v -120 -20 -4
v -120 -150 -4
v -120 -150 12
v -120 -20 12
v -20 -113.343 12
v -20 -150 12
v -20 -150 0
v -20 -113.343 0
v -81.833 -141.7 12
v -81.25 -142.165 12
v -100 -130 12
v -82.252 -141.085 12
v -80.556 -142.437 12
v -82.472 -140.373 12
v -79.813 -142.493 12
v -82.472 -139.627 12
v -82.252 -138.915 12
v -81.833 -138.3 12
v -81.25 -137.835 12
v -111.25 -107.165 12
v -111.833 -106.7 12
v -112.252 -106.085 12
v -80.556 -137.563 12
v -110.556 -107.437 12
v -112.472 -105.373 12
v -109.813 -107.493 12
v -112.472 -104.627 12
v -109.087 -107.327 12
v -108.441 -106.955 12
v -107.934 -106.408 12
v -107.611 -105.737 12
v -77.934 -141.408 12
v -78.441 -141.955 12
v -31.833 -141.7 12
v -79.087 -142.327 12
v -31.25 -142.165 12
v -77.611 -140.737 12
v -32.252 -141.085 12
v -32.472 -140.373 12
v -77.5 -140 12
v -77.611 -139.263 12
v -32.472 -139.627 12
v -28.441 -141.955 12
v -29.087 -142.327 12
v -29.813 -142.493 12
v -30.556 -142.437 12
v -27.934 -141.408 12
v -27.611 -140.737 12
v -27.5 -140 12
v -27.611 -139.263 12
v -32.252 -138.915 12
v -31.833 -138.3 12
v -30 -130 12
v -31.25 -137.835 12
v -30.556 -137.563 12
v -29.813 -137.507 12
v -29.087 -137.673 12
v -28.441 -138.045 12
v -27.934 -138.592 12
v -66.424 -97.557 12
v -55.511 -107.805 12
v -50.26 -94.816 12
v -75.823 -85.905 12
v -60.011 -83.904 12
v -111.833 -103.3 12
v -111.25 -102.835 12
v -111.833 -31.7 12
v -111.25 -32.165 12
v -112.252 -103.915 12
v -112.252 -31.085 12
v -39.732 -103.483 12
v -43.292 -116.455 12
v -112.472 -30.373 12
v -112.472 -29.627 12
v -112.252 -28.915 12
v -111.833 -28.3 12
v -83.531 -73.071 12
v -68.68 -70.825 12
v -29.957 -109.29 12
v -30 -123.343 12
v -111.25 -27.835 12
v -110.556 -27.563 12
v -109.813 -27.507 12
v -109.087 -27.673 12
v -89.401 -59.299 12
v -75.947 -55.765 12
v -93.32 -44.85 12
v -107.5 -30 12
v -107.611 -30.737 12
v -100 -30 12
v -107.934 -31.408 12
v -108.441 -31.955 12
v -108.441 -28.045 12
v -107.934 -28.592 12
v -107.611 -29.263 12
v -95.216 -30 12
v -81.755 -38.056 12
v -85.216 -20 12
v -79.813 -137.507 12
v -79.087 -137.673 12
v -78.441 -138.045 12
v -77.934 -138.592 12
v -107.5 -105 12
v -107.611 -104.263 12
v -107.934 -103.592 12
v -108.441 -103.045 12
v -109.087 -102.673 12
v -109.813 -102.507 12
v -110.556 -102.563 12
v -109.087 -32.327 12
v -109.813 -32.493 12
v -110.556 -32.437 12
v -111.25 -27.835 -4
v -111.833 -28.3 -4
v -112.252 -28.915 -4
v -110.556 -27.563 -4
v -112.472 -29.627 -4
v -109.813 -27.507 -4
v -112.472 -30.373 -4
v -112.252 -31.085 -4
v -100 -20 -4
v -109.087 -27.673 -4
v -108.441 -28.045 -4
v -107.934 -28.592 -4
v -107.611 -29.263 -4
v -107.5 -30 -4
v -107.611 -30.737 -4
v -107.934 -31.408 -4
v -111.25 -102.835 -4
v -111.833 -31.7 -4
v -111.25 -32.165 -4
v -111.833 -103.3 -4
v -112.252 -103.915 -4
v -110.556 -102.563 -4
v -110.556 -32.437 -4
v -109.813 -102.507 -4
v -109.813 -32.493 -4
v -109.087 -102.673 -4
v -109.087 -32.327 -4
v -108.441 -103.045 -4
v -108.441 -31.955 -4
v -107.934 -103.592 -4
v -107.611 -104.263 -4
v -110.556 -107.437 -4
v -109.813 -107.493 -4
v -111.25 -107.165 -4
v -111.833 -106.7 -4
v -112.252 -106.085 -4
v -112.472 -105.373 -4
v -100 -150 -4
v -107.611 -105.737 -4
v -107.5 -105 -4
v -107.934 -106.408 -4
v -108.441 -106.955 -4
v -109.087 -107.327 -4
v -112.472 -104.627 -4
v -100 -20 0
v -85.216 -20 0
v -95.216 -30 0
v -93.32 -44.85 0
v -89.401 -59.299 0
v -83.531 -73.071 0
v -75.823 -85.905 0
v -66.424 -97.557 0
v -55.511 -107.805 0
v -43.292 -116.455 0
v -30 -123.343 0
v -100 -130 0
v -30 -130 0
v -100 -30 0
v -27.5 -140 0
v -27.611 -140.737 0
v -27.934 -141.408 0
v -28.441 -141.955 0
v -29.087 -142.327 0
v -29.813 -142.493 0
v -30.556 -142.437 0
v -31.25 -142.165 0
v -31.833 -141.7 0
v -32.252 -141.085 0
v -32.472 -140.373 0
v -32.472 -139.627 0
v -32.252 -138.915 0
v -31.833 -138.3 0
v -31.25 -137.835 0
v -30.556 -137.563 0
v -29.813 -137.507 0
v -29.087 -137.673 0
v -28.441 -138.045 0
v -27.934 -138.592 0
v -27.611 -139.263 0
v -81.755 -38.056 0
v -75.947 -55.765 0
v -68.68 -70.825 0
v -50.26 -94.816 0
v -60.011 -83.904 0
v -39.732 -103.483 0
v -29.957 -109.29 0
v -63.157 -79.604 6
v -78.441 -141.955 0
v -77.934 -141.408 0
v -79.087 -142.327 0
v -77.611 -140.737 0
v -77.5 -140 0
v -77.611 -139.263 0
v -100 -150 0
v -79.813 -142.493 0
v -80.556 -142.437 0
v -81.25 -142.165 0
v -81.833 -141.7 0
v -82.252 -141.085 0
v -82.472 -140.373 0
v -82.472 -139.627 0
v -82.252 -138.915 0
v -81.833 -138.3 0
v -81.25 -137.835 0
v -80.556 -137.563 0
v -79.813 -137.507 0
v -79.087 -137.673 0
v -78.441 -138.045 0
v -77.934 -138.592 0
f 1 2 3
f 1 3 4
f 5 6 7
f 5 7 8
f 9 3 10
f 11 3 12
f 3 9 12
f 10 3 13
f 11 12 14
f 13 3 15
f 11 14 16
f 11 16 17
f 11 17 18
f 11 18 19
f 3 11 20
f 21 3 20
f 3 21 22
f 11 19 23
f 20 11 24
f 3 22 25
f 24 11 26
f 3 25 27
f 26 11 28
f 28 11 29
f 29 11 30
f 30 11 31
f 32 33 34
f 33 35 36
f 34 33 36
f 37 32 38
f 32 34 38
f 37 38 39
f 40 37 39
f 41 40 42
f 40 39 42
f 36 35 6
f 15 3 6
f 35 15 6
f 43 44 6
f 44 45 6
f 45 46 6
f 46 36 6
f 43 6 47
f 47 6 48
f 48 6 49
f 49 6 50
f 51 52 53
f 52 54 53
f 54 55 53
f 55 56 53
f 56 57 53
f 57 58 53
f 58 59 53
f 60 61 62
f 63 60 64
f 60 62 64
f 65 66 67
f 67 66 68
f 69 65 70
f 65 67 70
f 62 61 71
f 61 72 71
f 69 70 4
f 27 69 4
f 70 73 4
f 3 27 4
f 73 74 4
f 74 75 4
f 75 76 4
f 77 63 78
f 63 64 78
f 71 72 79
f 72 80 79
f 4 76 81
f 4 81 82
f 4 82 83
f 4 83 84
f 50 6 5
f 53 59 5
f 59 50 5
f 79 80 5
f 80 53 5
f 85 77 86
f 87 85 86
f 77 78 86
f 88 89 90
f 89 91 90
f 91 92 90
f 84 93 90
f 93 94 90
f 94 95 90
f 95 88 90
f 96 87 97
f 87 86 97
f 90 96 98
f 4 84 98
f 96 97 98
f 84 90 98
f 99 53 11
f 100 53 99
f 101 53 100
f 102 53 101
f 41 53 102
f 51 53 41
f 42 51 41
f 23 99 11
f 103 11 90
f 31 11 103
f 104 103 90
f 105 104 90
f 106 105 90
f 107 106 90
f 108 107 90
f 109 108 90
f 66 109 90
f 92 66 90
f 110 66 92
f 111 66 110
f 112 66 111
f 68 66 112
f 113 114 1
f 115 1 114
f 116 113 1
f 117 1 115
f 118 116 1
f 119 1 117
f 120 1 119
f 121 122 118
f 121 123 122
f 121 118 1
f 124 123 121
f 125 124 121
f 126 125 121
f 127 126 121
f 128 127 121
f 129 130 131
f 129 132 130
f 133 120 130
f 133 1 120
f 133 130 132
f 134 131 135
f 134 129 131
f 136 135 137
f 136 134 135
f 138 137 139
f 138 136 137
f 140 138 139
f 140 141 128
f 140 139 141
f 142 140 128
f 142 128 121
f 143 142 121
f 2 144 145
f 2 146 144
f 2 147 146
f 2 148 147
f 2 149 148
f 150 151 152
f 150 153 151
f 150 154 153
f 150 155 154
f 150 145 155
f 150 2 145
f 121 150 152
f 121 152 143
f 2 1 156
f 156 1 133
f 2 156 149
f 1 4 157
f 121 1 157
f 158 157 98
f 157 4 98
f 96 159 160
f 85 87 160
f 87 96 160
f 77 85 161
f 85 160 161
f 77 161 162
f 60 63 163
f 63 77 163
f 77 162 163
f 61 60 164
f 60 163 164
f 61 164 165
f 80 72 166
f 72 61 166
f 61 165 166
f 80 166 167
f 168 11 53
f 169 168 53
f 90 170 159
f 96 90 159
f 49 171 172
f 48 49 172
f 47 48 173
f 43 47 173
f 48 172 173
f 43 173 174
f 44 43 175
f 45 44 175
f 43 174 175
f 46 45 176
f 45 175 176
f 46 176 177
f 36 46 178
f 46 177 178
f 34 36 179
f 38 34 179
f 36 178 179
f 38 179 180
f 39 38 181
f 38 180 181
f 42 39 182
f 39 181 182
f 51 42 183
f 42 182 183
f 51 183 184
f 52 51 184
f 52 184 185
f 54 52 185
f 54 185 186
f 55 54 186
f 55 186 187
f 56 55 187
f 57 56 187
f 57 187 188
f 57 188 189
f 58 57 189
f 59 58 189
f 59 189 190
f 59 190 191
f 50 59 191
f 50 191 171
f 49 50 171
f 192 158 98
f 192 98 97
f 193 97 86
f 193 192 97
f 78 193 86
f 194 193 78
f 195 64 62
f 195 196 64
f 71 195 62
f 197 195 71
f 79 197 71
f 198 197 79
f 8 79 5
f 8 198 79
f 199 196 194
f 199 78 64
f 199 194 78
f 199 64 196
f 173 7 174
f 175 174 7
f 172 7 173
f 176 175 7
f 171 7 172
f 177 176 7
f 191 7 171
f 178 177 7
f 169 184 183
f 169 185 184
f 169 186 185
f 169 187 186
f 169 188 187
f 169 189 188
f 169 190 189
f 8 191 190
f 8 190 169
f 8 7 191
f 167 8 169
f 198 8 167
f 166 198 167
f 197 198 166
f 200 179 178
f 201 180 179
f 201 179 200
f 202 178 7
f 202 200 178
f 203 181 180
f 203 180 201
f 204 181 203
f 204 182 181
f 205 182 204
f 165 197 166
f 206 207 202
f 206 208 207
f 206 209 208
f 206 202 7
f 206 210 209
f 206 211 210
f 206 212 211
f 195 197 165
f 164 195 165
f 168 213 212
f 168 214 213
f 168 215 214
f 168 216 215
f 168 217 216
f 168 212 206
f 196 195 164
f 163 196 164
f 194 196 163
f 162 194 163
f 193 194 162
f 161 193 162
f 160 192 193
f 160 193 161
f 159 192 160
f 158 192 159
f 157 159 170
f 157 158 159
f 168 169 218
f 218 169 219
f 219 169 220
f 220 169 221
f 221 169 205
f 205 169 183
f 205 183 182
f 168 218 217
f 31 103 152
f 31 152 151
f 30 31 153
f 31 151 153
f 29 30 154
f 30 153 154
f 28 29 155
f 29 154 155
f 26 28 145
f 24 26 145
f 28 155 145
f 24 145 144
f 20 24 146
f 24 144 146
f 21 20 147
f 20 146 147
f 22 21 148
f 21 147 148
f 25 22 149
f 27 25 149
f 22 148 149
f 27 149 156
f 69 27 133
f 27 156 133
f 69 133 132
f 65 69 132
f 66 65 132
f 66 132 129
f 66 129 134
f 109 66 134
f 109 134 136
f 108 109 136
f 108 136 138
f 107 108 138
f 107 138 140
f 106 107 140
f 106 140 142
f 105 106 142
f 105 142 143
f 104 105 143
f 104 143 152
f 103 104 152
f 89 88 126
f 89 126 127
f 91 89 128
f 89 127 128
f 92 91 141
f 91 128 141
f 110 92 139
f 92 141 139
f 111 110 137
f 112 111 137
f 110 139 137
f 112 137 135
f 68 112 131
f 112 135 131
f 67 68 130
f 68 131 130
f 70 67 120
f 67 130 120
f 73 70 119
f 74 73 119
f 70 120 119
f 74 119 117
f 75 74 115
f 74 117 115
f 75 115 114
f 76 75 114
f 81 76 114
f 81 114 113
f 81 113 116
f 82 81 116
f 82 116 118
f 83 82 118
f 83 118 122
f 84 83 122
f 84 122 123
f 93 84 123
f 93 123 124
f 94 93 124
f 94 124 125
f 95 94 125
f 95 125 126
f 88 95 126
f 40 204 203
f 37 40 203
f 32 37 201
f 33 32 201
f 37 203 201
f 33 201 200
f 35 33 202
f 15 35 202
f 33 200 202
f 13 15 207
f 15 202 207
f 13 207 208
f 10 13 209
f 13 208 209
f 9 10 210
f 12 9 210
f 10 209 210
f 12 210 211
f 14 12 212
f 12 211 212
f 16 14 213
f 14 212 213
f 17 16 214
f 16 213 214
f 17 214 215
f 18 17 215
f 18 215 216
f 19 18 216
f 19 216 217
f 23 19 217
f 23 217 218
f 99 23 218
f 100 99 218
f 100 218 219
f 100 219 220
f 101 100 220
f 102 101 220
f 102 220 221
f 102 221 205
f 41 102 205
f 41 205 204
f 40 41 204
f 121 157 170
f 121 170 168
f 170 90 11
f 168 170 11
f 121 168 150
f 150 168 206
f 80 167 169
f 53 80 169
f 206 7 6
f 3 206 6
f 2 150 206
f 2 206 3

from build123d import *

# Parameters (mm, degrees)
F1_DEPTH  = 12
F2_W      = 100
F2_H      = 20
F3_DEPTH  = 5
F4_W      = 135
F4_H      = 20
F5_DEPTH  = 5
F7_R      = 2.5
F8_DEPTH  = 25
F9_DEPTH  = 5
F10_W     = 20
F10_H     = 20
F10_W_2   = 100
F10_H_2   = 130
F11_DEPTH = 25
F12_W     = 130
F12_H     = 9
F13_DEPTH = 100.0010001
F15_DEPTH = 12.0010001
F16_W     = 80
F16_H     = 4
F17_DEPTH = 20


with BuildPart() as f1:
    # F0 (on Top) → F1 (new body)
    with BuildSketch(Plane.XY):
        with BuildLine():
            add(Edge.make_bspline(
                [(-86.5, 0), (-86.5, -116.5), (0, -116.5)],
                knots=[1.5707963268, 1.5707963268, 1.5707963268, 3.1415926536, 3.1415926536, 3.1415926536], degree=2, weights=[1, 0.7071067812, 1]))
            Line((-86.5, 0), (-86.5, -116.5))
            Line((-86.5, -116.5), (0, -116.5))
        make_face()
        Polygon((-86.5, -116.5), (-86.5, 0), (-100, 0), (-100, -130), (0, -130), (0, -116.5), align=None)
    extrude(amount=F1_DEPTH)

    # F2 (on face) → F3 (join)
    with BuildSketch(Plane.XZ.offset(130)):
        with Locations((-50, 6)):
            Rectangle(F2_W, F2_H)
    extrude(amount=F3_DEPTH)

    # F4 (on face) → F5 (join)
    with BuildSketch(Plane(origin=(-100, 0, 0), x_dir=(0, -1, 0), z_dir=(-1, 0, 0))):
        with Locations((67.5, 6)):
            Rectangle(F4_W, F4_H)
    extrude(amount=F5_DEPTH)

    # F7 (on face) → F8 (join)
    with BuildSketch(Plane(origin=(0, 0, -4), x_dir=(1, 0, 0), z_dir=(0, 0, -1))):
        Polygon((0, 135), (0, 150), (-120, 150), (-120, 0), (-105, 0), (-105, 135), align=None)
        with Locations((-110, 30)):
            Circle(F7_R, mode=Mode.SUBTRACT)
        with Locations((-110, 105)):
            Circle(F7_R, mode=Mode.SUBTRACT)
        with Locations((-80, 140)):
            Circle(F7_R, mode=Mode.SUBTRACT)
        with Locations((-30, 140)):
            Circle(F7_R, mode=Mode.SUBTRACT)
    extrude(amount=-F8_DEPTH)

    # F6 (on face) → F9 (join)
    with BuildSketch(Plane.XY.offset(16)):
        Polygon((-90, 0), (-105, 0), (-105, -135), (0, -135), (0, -120), (-90, -120), align=None)
    extrude(amount=F9_DEPTH)

    # F10 (on Top) → F11 (cut, symmetric)
    with BuildSketch(Plane.XY):
        with Locations((-10, -10)):
            Rectangle(F10_W, F10_H)
        with Locations((-70, -10)):
            Rectangle(F10_W_2, F10_H)
        with Locations((-10, -85)):
            Rectangle(F10_W, F10_H_2)
    extrude(amount=F11_DEPTH, both=True, mode=Mode.SUBTRACT)

    # F12 (on face) → F13 (cut, through all)
    with BuildSketch(Plane.YZ.offset(-20)):
        with Locations((-85, 16.5)):
            Rectangle(F12_W, F12_H)
    extrude(amount=-F13_DEPTH, mode=Mode.SUBTRACT)

    # F14 (on face) → F15 (cut, through all)
    with BuildSketch(Plane(origin=(0, 0, 0), x_dir=(1, 0, 0), z_dir=(0, 0, -1))):
        with BuildLine():
            Line((-30, 130), (-100, 130))
            Line((-100, 130), (-100, 30))
            Line((-100, 30), (-95.2158076494, 30))
            ThreePointArc((-95.2158076494, 30), (-75.8232238431, 85.9047045014), (-30, 123.3431933691))
            Line((-30, 123.3431933691), (-30, 130))
        make_face()
    extrude(amount=-F15_DEPTH, mode=Mode.SUBTRACT)

    # F16 (on face) → F17 (cut, through all)
    with BuildSketch(Plane(origin=(0, -130, 0), x_dir=(-1, 0, 0), z_dir=(0, 1, 0))):
        with Locations((60, -2)):
            Rectangle(F16_W, F16_H)
    extrude(amount=-F17_DEPTH, mode=Mode.SUBTRACT)


solid = f1.part
